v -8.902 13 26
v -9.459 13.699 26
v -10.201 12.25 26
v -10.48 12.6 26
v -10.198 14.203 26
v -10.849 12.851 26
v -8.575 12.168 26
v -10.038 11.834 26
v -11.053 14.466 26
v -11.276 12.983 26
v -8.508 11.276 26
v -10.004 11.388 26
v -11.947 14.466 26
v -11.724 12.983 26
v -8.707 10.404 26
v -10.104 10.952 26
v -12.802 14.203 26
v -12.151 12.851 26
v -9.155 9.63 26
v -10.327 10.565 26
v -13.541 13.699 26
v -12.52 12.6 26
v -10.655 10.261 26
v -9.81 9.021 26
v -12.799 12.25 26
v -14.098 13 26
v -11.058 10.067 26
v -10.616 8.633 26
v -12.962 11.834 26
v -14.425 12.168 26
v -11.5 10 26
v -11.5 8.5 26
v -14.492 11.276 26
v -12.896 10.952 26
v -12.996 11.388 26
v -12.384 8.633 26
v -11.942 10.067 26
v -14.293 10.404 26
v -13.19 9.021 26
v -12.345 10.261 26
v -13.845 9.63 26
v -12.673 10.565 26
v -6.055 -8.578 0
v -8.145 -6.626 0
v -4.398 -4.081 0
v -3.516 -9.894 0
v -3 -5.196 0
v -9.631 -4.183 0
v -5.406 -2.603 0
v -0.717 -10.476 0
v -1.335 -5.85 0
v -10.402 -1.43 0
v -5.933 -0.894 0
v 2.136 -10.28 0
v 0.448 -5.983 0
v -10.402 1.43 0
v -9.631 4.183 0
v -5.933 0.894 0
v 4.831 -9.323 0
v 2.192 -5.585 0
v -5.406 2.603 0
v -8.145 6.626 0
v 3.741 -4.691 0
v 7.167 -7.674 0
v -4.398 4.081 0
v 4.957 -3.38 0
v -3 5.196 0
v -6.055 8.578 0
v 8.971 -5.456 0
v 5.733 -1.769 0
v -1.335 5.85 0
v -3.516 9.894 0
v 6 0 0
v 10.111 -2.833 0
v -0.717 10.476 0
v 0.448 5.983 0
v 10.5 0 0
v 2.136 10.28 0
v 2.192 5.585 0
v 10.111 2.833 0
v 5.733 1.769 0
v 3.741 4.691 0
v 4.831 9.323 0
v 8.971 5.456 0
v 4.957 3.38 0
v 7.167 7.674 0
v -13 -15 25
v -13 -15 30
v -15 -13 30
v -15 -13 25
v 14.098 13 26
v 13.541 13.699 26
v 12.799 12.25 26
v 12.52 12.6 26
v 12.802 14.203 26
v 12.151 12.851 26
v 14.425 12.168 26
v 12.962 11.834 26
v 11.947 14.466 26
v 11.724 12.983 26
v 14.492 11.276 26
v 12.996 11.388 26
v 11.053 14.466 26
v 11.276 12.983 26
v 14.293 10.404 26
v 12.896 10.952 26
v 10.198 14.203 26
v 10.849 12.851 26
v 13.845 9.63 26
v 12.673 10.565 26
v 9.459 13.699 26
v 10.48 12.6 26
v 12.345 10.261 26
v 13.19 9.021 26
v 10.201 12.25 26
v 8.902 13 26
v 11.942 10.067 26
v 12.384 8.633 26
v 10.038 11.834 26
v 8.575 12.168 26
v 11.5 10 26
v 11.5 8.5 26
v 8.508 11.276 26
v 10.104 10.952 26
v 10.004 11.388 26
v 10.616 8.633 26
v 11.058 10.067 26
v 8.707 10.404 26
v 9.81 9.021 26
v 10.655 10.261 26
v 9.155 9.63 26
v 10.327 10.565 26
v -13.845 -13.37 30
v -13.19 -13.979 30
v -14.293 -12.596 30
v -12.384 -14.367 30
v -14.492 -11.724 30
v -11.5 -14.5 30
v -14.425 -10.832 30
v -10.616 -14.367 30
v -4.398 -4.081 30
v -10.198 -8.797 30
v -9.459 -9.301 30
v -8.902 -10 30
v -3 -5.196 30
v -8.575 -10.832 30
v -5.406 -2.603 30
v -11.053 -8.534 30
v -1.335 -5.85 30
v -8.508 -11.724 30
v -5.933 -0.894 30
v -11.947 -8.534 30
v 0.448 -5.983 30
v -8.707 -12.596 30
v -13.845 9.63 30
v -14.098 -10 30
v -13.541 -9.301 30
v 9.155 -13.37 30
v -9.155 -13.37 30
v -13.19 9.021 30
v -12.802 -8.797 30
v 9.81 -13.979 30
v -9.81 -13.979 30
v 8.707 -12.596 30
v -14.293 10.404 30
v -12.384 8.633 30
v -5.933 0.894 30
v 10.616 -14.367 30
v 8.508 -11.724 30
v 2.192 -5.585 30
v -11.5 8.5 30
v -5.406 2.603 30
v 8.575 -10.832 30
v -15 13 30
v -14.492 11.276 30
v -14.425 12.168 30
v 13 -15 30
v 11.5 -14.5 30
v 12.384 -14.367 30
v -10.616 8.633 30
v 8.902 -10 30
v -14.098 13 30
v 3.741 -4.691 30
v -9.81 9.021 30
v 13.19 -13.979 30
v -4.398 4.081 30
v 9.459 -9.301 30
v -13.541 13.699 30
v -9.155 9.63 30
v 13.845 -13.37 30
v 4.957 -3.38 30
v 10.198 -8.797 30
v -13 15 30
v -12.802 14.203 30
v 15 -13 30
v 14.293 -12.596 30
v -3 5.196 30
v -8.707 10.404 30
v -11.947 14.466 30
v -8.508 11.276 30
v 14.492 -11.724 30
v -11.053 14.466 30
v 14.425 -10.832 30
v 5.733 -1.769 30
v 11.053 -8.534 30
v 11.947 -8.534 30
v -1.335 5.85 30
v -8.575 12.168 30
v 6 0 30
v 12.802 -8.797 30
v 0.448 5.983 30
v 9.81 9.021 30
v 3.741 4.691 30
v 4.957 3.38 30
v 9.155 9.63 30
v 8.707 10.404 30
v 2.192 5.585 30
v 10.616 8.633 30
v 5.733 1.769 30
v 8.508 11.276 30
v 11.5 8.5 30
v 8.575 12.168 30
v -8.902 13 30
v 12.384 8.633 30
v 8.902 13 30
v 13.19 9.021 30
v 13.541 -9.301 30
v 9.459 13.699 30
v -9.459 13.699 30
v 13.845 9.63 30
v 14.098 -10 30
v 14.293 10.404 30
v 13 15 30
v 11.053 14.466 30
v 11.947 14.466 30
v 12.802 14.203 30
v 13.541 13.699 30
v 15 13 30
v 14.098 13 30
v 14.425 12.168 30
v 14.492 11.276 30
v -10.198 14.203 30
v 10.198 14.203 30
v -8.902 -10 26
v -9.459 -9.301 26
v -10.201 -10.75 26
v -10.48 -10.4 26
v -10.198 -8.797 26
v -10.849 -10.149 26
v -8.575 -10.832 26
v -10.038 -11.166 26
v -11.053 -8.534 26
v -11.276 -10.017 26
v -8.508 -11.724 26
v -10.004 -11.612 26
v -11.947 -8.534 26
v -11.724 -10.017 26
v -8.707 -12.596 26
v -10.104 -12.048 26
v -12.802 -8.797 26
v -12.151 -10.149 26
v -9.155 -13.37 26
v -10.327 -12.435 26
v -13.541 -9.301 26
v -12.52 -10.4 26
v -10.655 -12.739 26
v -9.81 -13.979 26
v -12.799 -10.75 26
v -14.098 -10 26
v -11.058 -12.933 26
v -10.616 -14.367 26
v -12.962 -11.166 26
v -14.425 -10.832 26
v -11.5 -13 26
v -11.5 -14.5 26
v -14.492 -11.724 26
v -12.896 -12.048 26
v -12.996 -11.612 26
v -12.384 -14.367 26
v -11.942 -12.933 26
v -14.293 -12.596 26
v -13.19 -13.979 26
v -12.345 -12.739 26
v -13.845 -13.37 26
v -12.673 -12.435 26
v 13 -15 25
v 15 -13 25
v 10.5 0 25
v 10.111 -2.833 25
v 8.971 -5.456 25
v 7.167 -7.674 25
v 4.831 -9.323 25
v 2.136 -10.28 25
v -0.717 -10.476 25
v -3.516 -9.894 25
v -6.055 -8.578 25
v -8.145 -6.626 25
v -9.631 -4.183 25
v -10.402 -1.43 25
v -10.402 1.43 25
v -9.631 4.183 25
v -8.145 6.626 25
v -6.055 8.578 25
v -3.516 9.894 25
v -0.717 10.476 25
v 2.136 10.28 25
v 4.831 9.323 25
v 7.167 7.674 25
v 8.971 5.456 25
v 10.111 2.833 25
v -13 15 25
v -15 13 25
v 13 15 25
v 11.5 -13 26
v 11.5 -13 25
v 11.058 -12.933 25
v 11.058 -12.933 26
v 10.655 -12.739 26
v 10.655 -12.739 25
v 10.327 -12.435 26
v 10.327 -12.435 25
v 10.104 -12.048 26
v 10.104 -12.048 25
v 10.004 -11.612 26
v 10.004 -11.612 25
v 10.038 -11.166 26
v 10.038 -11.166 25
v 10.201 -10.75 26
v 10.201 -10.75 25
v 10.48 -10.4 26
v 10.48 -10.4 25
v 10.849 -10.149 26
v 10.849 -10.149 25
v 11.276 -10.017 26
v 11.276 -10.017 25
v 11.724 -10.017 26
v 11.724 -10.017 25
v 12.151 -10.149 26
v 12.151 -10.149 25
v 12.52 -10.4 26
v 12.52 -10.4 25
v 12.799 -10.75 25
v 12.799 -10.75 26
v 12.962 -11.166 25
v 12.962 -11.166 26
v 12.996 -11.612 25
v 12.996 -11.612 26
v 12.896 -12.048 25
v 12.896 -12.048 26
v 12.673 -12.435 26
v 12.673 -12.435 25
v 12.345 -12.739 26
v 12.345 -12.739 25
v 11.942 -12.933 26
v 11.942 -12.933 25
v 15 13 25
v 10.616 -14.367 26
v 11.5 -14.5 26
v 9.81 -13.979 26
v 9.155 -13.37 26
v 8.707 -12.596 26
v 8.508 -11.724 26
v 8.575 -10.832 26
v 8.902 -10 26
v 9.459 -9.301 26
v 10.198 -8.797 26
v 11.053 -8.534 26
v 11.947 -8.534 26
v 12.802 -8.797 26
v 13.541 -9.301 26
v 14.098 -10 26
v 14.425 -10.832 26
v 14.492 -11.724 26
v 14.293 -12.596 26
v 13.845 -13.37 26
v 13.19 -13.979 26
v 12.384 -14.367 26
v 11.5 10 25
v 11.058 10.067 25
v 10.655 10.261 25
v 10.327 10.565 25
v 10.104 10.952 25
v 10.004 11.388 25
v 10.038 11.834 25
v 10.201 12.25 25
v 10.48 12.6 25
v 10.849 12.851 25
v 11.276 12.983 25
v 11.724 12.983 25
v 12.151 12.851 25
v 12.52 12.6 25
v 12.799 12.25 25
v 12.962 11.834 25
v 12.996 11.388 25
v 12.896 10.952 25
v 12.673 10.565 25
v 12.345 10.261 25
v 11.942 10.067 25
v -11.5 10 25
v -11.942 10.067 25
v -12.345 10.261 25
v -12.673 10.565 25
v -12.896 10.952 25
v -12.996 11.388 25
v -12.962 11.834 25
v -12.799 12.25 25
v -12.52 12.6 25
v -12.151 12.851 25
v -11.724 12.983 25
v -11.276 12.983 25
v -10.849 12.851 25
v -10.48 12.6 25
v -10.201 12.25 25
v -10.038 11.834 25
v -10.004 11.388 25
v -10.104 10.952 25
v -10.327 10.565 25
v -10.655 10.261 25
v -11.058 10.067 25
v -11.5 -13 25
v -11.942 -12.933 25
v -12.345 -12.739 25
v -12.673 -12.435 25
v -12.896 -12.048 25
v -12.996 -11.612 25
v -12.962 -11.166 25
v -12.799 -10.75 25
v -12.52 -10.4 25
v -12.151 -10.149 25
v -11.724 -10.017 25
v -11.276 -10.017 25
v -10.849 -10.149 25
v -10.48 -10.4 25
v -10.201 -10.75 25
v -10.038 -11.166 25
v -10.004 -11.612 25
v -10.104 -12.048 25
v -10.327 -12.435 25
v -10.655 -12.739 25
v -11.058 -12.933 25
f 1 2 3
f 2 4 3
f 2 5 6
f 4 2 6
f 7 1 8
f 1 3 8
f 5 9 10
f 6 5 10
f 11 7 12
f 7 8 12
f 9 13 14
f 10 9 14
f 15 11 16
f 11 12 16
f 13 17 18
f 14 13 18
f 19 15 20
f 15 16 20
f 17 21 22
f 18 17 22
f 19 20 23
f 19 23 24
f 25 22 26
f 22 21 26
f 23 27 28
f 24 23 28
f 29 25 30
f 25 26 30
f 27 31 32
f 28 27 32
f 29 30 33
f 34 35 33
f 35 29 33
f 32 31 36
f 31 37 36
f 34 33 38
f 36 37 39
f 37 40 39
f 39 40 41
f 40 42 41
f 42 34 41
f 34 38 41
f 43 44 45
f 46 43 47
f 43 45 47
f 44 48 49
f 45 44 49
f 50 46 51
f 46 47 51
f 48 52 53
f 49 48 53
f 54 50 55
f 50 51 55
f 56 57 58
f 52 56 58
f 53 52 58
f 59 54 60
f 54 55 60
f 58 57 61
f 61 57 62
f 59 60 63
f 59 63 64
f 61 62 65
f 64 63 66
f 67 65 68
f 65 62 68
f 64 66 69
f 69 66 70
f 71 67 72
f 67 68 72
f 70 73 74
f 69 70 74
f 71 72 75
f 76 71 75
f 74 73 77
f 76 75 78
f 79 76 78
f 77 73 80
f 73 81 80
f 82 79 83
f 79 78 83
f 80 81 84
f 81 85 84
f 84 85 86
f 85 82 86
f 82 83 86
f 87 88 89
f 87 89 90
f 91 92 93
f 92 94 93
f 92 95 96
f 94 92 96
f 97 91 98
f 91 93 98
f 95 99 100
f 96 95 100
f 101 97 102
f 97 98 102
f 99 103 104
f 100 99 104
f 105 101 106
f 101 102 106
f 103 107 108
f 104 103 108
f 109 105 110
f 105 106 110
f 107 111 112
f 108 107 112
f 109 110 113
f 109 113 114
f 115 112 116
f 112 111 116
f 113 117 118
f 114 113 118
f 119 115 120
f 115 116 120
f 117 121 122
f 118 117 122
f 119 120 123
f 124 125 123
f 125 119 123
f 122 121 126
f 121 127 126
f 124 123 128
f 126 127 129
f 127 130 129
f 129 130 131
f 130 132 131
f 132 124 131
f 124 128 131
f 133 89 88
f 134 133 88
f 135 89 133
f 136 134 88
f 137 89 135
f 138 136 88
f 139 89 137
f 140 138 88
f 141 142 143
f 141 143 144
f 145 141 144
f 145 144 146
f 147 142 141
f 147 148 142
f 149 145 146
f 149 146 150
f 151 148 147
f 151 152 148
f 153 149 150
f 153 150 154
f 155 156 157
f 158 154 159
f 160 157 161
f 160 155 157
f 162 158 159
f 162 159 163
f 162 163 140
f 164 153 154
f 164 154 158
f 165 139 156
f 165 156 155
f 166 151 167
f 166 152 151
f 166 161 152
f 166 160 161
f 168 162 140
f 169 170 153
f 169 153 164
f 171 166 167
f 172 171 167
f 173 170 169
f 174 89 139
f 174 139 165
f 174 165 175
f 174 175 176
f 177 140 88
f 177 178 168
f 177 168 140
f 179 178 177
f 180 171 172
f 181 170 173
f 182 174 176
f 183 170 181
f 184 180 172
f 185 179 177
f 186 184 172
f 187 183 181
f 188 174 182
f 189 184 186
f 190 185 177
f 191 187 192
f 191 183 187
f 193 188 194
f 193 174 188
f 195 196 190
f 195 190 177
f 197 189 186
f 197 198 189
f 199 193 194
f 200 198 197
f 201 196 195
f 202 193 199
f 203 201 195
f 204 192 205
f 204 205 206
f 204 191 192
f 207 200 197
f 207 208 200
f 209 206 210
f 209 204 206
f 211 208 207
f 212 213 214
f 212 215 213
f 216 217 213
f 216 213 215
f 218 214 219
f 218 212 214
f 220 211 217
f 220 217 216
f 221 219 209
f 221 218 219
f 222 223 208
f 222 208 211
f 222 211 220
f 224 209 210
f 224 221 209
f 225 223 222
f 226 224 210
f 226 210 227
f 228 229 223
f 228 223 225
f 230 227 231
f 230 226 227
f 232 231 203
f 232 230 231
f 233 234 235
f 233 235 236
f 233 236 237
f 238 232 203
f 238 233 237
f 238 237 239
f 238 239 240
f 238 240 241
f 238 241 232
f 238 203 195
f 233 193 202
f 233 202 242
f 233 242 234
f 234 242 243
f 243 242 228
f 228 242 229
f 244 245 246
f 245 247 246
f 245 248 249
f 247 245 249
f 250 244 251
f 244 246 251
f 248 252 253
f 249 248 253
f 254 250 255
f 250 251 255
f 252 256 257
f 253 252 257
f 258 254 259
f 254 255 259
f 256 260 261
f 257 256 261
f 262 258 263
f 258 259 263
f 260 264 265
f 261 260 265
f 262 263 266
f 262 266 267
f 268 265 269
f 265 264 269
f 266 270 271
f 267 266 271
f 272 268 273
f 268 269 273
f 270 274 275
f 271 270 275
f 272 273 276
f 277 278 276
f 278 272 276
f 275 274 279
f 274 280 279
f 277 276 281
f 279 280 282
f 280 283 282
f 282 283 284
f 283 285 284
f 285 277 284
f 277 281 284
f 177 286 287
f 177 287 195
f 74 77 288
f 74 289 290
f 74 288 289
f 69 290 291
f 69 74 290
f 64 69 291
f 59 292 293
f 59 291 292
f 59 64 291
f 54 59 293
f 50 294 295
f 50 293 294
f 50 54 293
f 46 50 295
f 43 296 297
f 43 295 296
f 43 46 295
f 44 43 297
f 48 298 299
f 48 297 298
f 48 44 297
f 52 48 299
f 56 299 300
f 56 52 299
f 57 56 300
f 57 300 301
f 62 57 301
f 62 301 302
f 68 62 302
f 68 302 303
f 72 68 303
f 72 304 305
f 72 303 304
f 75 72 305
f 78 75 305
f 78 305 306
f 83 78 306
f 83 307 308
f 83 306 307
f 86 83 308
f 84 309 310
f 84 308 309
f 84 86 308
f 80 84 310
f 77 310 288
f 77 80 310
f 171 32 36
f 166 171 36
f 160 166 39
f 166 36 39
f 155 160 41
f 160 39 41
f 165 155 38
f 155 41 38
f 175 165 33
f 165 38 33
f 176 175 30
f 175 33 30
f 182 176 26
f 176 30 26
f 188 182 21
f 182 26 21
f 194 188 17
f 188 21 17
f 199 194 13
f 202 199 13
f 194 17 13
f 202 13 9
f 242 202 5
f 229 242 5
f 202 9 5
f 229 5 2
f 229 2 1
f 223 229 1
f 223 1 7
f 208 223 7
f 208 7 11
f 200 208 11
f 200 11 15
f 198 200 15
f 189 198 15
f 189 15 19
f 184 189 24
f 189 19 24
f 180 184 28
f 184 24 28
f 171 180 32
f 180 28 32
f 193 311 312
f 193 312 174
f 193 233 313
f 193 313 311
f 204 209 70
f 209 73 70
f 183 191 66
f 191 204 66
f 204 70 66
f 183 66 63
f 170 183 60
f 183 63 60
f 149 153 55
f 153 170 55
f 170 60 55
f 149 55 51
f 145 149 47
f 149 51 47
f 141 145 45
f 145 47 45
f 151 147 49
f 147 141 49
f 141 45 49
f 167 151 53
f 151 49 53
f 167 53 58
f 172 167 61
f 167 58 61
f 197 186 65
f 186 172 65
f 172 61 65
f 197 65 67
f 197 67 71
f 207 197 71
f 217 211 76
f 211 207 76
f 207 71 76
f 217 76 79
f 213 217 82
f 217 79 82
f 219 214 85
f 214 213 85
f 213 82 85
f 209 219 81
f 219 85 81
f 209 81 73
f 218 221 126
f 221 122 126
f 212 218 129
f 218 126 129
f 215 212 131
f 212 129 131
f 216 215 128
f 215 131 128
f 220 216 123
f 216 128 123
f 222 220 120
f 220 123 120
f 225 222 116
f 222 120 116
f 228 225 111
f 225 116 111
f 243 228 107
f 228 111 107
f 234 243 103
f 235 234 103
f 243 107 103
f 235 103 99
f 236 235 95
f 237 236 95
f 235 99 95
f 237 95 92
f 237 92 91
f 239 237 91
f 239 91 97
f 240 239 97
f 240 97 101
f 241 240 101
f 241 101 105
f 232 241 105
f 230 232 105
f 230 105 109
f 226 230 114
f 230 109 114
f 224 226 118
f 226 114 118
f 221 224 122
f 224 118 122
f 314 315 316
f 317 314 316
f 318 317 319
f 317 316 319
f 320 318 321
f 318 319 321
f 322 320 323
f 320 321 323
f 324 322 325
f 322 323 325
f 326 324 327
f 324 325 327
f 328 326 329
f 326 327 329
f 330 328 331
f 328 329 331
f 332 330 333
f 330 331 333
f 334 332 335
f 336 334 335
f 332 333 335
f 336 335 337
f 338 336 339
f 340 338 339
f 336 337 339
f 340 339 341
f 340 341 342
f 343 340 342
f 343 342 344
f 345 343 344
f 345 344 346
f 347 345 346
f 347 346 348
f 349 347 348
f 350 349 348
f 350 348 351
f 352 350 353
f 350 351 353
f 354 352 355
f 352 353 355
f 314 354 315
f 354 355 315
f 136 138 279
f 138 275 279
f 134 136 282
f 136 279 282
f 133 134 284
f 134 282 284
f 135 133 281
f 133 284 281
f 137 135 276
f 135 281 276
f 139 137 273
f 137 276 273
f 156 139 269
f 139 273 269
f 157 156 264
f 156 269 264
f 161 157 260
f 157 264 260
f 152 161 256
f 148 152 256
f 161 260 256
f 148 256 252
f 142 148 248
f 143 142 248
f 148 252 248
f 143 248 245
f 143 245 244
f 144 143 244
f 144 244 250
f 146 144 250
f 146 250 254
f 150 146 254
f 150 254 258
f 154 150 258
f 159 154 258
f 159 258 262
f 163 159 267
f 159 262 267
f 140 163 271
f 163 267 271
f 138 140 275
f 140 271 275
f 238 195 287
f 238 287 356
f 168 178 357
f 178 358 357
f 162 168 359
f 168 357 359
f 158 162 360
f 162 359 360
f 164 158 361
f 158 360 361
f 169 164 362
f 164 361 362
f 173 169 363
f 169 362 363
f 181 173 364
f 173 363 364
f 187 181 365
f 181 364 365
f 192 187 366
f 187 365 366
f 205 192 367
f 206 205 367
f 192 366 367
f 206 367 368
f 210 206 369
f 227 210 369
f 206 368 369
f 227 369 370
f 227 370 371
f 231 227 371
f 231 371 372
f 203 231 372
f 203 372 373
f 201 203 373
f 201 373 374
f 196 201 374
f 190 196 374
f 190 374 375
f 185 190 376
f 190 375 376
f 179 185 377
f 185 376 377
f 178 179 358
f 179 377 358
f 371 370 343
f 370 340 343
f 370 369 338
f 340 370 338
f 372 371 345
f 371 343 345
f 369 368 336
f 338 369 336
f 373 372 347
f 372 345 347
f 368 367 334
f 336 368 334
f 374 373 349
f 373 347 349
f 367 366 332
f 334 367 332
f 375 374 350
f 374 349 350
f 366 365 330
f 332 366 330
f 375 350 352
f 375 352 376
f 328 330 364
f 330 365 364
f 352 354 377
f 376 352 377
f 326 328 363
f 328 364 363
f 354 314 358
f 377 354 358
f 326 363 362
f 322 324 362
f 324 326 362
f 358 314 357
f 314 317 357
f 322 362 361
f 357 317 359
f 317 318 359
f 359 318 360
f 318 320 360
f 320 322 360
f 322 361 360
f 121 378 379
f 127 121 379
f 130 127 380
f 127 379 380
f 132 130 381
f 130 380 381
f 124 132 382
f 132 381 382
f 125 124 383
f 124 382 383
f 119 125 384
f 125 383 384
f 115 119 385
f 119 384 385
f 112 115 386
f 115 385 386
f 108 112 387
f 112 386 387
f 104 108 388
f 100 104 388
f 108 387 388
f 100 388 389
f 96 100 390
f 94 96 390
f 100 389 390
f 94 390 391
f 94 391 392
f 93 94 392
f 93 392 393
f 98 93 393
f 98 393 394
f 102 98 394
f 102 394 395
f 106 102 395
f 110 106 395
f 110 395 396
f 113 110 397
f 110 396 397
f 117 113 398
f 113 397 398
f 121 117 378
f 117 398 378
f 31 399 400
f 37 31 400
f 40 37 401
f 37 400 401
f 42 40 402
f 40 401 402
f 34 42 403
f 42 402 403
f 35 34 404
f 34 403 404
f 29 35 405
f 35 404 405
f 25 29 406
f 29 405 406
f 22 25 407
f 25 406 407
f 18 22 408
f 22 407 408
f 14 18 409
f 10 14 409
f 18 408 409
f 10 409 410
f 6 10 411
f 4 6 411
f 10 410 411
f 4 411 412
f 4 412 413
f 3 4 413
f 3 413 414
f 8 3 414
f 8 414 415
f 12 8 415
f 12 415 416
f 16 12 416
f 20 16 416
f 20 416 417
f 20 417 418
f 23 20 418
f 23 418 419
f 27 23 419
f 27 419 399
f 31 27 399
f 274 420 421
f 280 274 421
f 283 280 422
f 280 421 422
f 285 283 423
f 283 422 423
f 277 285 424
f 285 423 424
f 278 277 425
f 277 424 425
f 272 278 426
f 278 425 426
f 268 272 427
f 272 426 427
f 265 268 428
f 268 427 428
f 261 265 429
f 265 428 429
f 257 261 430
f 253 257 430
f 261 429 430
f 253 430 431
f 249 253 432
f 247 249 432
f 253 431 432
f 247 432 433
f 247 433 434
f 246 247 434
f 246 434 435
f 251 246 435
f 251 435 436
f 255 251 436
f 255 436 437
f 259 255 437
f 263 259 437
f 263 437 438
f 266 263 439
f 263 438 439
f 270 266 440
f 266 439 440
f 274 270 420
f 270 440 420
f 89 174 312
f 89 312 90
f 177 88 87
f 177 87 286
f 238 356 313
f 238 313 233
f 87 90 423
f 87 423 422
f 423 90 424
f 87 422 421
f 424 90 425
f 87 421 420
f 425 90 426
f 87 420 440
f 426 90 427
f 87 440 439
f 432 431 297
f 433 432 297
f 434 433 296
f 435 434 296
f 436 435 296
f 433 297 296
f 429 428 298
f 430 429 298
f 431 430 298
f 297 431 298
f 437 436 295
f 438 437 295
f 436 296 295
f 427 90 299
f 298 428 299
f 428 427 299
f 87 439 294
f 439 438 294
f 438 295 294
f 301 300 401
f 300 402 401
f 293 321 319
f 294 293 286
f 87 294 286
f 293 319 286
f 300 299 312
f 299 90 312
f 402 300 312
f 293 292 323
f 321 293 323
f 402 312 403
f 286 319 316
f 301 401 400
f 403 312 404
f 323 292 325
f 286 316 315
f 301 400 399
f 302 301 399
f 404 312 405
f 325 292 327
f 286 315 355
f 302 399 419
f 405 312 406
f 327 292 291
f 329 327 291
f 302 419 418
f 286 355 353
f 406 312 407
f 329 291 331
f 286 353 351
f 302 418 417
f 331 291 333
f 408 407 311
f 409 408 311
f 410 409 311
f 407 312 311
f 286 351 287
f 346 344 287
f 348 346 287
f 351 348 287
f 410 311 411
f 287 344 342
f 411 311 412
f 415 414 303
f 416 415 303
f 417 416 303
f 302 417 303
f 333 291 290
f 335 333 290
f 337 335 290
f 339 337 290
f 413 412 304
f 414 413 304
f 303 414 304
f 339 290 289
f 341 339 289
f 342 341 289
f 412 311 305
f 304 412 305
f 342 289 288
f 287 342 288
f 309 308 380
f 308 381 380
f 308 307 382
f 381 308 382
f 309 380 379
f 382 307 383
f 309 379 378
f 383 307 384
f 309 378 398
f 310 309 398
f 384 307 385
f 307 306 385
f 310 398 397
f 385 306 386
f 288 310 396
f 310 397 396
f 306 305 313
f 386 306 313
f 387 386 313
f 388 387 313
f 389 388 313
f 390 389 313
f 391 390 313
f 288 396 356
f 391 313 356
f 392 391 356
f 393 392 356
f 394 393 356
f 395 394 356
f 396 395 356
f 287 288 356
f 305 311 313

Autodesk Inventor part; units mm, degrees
ref_plane "YZ Plane" through (0, 0, 0) normal (1, 0, 0) x (0, 1, 0)
ref_plane "XZ Plane" through (0, 0, 0) normal (0, 1, 0) x (-1, 0, 0)
ref_plane "XY Plane" through (0, 0, 0) normal (0, 0, 1) x (1, 0, 0)
sketch "Sketch1" plane through (0, 0, 0) normal (0, 0, 1) x (1, 0, 0)
  circle A0 centre (0, 0) radius 10.5
  circle A1 centre (0, 0) radius 6
  dimension "d0" = 12
  dimension "d1" = 21
extrude "Extrusion1" add sketch "Sketch1" along normal blind 30
sketch "Sketch2" plane through (0, 0, 30) normal (0, 0, 1) x (1, 0, 0)
  circle A0 centre (0, 0) radius 6 projected
  circle A1 centre (0, 0) radius 10.5 projected
  line L0 (-15, -15) -> (15, -15)
  line L1 (15, -15) -> (15, 15)
  line L2 (15, 15) -> (-15, 15)
  line L3 (-15, 15) -> (-15, -15)
  line L4 (-15, -15) -> (15, 15) construction
  line L5 (15, -15) -> (-15, 15) construction
  dimension "d4" = 30
extrude "Extrusion2" add sketch "Sketch2" against normal blind 5 contours L3 L2 L1 L0
chamfer "Chamfer1" distance 2 angle 45 4 edges at (-15, 15, 27.5) (-15, -15, 27.5) (15, -15, 27.5) (15, 15, 27.5)
sketch "Sketch3" plane through (0, 0, 30) normal (0, 0, 1) x (1, 0, 0)
  point P0 (0, 0)
  point P1 (11.5, 11.5)
  point P2 (11.5, -11.5)
  point P3 (-11.5, -11.5)
  point P4 (-11.5, 11.5)
  dimension "d10" = 23
  dimension "d11" = 11.5
  dimension "d12" = 11.5
  dimension "d13" = 23
hole "Hole1" at (11.5, 11.5, 30) at (11.5, -11.5, 30) at (-11.5, -11.5, 30) at (-11.5, 11.5, 30) direction (0, 0, -1) diameter 3 depth 8 tip angle 118 counterbore diameter 6 counterbore depth 4
equation "\"d11\" = 0.5 * d10"
equation "\"d12\" = d11"
equation "\"d13\" = d10"
properties part number "LM12UU" material "Stainless Steel"
